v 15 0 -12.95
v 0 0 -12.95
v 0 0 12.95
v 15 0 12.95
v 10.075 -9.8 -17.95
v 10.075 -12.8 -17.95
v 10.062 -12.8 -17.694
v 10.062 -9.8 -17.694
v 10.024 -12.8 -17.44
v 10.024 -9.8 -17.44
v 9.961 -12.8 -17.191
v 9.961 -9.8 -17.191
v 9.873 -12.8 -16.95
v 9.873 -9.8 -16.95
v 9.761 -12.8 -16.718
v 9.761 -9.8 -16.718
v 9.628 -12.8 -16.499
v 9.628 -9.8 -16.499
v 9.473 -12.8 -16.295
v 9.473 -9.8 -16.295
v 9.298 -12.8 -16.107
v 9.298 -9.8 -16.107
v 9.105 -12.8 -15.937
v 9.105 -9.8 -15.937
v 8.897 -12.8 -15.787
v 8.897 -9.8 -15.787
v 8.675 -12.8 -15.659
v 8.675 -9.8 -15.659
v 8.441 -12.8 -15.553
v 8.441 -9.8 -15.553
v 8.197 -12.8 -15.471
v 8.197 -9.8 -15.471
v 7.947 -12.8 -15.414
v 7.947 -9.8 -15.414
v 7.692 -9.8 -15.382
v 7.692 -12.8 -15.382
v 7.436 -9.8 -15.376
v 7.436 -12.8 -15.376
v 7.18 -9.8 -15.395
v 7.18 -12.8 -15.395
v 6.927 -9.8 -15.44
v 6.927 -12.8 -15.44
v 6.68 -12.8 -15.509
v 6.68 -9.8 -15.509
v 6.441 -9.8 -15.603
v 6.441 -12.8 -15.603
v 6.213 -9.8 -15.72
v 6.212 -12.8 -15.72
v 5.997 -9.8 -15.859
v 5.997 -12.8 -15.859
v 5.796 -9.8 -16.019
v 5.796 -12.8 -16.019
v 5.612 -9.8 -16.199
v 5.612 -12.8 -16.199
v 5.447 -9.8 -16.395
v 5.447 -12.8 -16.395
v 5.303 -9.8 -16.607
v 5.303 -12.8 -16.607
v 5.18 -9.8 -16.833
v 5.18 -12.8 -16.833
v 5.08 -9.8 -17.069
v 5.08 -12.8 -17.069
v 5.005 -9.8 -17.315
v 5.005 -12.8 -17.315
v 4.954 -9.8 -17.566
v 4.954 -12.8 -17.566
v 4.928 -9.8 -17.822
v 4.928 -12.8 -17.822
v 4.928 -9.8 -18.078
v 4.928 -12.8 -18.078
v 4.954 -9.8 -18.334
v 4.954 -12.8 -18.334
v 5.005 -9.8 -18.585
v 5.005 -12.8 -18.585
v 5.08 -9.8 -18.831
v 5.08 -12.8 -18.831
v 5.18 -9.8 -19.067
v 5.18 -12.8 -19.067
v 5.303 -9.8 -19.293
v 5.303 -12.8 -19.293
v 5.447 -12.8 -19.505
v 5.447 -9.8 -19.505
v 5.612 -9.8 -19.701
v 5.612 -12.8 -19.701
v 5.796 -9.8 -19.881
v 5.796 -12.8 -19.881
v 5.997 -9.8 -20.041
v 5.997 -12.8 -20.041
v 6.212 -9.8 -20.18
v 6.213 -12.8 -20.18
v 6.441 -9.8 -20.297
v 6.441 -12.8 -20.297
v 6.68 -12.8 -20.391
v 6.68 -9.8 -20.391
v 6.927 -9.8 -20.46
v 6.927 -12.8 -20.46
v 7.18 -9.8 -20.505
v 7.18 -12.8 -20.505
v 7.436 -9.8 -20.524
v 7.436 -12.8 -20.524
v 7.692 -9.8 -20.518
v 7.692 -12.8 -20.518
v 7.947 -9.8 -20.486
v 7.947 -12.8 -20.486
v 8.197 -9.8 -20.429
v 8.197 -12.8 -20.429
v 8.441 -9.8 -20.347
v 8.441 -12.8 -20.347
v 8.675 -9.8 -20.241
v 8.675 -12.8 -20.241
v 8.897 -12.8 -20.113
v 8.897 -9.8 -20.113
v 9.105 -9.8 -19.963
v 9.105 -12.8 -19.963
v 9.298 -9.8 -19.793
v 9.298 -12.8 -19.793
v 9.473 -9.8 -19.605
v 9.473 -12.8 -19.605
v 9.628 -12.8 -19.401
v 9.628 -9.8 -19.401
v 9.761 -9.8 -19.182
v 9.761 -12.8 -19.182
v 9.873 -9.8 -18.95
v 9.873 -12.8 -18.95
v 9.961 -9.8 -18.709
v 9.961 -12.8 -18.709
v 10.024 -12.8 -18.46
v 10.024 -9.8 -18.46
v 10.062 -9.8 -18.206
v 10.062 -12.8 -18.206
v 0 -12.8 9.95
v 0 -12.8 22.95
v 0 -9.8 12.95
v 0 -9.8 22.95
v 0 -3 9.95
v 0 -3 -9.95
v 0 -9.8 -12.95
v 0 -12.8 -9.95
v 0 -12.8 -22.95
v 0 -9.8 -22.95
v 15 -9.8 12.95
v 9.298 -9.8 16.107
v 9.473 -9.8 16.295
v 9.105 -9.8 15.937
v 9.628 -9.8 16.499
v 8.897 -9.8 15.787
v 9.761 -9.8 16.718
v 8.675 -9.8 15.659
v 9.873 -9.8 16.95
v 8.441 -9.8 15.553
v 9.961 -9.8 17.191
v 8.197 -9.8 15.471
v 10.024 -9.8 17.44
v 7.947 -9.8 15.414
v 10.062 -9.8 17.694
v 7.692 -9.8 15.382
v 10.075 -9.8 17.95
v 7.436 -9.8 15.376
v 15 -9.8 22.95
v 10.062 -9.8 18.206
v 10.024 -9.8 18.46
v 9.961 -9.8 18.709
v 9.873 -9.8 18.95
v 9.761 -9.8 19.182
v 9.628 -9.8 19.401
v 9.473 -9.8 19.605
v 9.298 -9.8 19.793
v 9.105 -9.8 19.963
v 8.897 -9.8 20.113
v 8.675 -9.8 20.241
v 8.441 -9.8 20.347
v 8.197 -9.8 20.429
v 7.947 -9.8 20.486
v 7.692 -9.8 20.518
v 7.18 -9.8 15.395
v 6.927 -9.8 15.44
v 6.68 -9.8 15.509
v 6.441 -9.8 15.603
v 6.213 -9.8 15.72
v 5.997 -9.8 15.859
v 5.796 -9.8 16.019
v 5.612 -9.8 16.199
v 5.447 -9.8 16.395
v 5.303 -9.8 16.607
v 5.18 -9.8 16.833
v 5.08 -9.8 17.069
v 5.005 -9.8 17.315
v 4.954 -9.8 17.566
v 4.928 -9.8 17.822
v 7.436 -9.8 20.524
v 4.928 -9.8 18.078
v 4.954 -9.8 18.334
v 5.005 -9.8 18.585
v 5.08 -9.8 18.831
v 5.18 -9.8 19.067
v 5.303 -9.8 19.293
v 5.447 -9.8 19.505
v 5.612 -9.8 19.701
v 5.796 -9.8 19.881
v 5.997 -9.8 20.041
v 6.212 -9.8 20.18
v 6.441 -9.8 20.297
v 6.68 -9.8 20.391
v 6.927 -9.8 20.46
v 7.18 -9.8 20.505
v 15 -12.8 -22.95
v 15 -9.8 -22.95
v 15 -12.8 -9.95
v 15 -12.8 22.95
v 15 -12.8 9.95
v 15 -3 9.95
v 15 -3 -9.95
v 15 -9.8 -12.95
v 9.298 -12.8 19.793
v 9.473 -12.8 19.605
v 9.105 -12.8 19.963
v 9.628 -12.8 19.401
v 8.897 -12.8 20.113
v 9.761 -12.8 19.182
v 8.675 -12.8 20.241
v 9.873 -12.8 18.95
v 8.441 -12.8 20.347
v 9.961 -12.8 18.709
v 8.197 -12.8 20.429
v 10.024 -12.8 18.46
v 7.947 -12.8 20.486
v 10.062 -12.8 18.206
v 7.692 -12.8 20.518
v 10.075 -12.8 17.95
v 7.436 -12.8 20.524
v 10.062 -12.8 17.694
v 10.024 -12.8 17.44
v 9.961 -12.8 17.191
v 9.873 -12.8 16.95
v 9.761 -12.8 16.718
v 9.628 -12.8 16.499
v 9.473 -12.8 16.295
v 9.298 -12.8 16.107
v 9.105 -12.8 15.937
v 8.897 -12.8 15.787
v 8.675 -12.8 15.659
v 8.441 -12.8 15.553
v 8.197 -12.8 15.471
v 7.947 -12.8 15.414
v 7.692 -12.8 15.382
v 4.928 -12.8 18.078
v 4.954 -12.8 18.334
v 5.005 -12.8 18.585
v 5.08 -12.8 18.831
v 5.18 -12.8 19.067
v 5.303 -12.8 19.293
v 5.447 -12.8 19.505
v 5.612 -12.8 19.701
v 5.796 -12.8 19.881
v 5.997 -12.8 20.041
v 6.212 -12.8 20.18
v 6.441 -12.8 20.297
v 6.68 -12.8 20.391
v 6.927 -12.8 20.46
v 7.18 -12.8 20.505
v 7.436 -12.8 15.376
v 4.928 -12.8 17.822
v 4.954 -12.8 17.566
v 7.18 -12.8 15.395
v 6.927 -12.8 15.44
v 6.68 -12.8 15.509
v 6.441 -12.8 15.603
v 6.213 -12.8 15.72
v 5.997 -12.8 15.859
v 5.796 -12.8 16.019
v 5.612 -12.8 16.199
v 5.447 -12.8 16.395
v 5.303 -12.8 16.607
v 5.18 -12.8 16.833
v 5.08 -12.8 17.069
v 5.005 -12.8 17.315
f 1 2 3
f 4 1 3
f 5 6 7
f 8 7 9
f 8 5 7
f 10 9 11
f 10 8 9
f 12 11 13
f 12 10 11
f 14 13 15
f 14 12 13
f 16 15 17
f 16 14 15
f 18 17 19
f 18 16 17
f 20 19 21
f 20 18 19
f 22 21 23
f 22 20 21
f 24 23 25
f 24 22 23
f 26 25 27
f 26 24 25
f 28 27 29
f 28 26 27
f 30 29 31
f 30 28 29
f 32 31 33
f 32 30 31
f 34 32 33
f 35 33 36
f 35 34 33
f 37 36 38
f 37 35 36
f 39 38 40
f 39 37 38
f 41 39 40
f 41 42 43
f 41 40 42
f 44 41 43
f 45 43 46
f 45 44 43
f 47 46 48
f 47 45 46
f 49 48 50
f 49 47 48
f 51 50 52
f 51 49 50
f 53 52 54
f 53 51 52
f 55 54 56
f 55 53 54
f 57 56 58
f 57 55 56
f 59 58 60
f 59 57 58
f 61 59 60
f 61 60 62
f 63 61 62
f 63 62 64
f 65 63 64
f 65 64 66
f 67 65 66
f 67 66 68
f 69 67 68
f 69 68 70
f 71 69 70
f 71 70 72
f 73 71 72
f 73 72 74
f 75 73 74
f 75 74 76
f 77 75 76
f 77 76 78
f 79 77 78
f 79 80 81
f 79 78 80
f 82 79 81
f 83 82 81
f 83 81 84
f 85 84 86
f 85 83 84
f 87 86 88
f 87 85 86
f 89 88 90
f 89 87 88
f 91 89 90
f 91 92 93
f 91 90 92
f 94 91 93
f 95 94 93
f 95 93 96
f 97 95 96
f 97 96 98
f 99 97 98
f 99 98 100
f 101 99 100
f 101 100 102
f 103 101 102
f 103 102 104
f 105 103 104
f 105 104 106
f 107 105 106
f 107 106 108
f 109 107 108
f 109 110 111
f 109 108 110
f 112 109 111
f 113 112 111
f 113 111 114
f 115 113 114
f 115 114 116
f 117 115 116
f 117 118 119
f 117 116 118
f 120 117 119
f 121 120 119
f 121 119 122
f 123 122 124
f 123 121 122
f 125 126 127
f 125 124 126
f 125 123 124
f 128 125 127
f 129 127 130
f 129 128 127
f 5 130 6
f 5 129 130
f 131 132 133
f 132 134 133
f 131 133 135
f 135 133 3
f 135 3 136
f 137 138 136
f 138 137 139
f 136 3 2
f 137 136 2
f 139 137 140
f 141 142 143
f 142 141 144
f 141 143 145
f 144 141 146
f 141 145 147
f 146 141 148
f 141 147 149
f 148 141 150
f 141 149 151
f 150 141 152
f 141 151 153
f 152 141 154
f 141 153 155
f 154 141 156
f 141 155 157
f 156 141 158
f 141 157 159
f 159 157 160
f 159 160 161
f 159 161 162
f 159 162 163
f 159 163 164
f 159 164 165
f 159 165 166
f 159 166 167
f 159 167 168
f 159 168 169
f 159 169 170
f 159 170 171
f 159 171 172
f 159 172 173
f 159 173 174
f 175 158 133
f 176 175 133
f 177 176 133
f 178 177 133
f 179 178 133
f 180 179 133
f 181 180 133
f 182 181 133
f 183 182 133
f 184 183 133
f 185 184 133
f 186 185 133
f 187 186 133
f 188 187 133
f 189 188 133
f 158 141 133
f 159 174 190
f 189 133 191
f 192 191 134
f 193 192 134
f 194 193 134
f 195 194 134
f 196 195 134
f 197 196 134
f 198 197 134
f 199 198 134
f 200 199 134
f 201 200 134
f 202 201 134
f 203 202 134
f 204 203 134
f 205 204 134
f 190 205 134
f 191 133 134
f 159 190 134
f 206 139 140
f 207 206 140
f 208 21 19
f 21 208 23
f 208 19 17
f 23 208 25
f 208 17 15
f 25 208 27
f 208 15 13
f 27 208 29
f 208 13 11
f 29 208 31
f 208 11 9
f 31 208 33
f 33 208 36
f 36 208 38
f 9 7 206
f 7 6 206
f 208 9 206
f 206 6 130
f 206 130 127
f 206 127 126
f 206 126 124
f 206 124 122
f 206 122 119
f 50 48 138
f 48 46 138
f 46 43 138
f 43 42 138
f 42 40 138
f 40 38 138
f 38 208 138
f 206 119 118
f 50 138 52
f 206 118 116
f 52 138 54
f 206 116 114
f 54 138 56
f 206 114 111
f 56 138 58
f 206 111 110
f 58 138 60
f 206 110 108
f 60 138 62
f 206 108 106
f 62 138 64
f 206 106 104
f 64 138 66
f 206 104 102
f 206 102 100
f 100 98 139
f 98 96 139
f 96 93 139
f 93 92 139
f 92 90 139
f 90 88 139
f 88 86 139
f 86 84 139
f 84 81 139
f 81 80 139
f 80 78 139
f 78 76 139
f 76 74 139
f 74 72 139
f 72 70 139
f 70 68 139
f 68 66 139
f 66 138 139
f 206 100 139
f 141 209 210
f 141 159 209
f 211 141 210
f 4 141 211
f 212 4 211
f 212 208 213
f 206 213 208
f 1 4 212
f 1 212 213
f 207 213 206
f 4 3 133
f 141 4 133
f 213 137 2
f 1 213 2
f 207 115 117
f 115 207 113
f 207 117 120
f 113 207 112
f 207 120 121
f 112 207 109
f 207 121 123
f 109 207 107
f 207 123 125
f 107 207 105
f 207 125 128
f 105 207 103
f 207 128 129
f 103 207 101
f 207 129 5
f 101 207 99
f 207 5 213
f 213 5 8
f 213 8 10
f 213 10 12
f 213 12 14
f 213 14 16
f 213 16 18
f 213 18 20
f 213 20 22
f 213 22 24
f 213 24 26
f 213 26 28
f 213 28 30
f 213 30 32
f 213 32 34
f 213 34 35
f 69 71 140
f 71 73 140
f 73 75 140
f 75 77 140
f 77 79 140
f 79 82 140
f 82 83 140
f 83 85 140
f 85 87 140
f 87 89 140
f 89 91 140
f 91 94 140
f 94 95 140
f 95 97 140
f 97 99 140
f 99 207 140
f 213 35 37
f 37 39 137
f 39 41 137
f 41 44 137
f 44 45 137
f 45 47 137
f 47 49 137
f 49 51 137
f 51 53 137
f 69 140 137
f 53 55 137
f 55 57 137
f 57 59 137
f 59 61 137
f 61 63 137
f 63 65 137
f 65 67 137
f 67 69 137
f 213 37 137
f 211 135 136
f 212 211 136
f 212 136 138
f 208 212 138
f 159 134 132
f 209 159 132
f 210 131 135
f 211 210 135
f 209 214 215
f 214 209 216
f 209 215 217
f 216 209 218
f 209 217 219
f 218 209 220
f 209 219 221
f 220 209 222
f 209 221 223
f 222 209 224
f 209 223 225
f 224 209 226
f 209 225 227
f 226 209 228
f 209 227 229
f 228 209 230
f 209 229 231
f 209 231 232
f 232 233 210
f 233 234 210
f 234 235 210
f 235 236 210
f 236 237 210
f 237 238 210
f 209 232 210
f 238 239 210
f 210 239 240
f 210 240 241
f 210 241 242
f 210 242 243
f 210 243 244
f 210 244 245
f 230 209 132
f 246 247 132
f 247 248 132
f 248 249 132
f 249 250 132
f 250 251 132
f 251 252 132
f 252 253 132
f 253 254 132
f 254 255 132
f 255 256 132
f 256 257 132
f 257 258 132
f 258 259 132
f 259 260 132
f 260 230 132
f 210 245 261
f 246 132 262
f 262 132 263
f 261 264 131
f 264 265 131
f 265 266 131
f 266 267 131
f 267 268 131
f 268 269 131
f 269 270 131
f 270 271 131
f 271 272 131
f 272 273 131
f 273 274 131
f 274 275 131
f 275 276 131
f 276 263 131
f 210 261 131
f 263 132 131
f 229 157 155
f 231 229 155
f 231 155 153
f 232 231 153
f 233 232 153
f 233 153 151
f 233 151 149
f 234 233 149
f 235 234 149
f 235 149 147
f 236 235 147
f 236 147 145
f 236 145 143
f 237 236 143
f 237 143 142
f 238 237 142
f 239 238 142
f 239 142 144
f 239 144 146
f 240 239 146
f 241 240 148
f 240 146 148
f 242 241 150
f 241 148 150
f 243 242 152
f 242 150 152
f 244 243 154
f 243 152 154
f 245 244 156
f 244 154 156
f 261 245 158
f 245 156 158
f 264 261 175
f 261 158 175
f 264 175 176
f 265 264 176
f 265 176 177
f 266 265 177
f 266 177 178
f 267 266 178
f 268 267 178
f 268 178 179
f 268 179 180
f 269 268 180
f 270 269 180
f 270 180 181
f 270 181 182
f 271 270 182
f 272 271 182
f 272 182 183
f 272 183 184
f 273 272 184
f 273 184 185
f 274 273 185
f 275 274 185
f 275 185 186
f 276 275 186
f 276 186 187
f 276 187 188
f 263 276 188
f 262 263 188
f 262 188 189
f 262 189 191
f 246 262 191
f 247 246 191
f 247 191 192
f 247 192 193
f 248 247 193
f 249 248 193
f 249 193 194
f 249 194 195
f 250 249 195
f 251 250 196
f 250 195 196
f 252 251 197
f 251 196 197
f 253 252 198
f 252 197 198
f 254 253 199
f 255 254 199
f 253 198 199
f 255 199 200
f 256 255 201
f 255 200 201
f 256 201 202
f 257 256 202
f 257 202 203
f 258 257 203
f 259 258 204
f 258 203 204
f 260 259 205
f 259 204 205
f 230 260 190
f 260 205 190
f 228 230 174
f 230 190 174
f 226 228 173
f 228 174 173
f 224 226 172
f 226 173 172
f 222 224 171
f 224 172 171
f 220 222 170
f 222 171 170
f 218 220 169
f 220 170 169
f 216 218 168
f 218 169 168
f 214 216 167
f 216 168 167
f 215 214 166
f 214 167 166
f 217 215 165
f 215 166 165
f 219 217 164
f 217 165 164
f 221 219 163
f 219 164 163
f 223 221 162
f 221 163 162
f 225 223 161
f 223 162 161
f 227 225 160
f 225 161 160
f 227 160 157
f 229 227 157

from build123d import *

# Parameters (mm, degrees)
SALIENTE_EXTRUIR1_DEPTH = 15
CROQUIS5_R              = 2.575
CORTAR_EXTRUIR1_DEPTH   = 4


with BuildPart() as part:
    # Croquis2 → Saliente-Extruir1 (new body)
    with BuildSketch(Plane(origin=(0, 0, 0), x_dir=(0, 0, -1), z_dir=(1, 0, 0))):
        Polygon((-22.95, -12.8), (-9.95, -12.8), (-9.95, -3), (9.95, -3), (9.95, -12.8), (22.95, -12.8), (22.95, -9.8), (12.95, -9.8), (12.95, 0), (-12.95, 0), (-12.95, -9.8), (-22.95, -9.8), align=None)
    extrude(amount=SALIENTE_EXTRUIR1_DEPTH)

    # Croquis5 → Cortar-Extruir1 (cut, through all)
    with BuildSketch(Plane(origin=(0, -9.8, 0), x_dir=(1, 0, 0), z_dir=(0, 1, 0))):
        with Locations((7.5, -17.95)):
            Circle(CROQUIS5_R)
    cortar_extruir1 = extrude(amount=-CORTAR_EXTRUIR1_DEPTH, mode=Mode.SUBTRACT)

    # Simetría1: Cortar-Extruir1 across plane
    add(cortar_extruir1.mirror(Plane.XY), mode=Mode.SUBTRACT)


solid = part.part
